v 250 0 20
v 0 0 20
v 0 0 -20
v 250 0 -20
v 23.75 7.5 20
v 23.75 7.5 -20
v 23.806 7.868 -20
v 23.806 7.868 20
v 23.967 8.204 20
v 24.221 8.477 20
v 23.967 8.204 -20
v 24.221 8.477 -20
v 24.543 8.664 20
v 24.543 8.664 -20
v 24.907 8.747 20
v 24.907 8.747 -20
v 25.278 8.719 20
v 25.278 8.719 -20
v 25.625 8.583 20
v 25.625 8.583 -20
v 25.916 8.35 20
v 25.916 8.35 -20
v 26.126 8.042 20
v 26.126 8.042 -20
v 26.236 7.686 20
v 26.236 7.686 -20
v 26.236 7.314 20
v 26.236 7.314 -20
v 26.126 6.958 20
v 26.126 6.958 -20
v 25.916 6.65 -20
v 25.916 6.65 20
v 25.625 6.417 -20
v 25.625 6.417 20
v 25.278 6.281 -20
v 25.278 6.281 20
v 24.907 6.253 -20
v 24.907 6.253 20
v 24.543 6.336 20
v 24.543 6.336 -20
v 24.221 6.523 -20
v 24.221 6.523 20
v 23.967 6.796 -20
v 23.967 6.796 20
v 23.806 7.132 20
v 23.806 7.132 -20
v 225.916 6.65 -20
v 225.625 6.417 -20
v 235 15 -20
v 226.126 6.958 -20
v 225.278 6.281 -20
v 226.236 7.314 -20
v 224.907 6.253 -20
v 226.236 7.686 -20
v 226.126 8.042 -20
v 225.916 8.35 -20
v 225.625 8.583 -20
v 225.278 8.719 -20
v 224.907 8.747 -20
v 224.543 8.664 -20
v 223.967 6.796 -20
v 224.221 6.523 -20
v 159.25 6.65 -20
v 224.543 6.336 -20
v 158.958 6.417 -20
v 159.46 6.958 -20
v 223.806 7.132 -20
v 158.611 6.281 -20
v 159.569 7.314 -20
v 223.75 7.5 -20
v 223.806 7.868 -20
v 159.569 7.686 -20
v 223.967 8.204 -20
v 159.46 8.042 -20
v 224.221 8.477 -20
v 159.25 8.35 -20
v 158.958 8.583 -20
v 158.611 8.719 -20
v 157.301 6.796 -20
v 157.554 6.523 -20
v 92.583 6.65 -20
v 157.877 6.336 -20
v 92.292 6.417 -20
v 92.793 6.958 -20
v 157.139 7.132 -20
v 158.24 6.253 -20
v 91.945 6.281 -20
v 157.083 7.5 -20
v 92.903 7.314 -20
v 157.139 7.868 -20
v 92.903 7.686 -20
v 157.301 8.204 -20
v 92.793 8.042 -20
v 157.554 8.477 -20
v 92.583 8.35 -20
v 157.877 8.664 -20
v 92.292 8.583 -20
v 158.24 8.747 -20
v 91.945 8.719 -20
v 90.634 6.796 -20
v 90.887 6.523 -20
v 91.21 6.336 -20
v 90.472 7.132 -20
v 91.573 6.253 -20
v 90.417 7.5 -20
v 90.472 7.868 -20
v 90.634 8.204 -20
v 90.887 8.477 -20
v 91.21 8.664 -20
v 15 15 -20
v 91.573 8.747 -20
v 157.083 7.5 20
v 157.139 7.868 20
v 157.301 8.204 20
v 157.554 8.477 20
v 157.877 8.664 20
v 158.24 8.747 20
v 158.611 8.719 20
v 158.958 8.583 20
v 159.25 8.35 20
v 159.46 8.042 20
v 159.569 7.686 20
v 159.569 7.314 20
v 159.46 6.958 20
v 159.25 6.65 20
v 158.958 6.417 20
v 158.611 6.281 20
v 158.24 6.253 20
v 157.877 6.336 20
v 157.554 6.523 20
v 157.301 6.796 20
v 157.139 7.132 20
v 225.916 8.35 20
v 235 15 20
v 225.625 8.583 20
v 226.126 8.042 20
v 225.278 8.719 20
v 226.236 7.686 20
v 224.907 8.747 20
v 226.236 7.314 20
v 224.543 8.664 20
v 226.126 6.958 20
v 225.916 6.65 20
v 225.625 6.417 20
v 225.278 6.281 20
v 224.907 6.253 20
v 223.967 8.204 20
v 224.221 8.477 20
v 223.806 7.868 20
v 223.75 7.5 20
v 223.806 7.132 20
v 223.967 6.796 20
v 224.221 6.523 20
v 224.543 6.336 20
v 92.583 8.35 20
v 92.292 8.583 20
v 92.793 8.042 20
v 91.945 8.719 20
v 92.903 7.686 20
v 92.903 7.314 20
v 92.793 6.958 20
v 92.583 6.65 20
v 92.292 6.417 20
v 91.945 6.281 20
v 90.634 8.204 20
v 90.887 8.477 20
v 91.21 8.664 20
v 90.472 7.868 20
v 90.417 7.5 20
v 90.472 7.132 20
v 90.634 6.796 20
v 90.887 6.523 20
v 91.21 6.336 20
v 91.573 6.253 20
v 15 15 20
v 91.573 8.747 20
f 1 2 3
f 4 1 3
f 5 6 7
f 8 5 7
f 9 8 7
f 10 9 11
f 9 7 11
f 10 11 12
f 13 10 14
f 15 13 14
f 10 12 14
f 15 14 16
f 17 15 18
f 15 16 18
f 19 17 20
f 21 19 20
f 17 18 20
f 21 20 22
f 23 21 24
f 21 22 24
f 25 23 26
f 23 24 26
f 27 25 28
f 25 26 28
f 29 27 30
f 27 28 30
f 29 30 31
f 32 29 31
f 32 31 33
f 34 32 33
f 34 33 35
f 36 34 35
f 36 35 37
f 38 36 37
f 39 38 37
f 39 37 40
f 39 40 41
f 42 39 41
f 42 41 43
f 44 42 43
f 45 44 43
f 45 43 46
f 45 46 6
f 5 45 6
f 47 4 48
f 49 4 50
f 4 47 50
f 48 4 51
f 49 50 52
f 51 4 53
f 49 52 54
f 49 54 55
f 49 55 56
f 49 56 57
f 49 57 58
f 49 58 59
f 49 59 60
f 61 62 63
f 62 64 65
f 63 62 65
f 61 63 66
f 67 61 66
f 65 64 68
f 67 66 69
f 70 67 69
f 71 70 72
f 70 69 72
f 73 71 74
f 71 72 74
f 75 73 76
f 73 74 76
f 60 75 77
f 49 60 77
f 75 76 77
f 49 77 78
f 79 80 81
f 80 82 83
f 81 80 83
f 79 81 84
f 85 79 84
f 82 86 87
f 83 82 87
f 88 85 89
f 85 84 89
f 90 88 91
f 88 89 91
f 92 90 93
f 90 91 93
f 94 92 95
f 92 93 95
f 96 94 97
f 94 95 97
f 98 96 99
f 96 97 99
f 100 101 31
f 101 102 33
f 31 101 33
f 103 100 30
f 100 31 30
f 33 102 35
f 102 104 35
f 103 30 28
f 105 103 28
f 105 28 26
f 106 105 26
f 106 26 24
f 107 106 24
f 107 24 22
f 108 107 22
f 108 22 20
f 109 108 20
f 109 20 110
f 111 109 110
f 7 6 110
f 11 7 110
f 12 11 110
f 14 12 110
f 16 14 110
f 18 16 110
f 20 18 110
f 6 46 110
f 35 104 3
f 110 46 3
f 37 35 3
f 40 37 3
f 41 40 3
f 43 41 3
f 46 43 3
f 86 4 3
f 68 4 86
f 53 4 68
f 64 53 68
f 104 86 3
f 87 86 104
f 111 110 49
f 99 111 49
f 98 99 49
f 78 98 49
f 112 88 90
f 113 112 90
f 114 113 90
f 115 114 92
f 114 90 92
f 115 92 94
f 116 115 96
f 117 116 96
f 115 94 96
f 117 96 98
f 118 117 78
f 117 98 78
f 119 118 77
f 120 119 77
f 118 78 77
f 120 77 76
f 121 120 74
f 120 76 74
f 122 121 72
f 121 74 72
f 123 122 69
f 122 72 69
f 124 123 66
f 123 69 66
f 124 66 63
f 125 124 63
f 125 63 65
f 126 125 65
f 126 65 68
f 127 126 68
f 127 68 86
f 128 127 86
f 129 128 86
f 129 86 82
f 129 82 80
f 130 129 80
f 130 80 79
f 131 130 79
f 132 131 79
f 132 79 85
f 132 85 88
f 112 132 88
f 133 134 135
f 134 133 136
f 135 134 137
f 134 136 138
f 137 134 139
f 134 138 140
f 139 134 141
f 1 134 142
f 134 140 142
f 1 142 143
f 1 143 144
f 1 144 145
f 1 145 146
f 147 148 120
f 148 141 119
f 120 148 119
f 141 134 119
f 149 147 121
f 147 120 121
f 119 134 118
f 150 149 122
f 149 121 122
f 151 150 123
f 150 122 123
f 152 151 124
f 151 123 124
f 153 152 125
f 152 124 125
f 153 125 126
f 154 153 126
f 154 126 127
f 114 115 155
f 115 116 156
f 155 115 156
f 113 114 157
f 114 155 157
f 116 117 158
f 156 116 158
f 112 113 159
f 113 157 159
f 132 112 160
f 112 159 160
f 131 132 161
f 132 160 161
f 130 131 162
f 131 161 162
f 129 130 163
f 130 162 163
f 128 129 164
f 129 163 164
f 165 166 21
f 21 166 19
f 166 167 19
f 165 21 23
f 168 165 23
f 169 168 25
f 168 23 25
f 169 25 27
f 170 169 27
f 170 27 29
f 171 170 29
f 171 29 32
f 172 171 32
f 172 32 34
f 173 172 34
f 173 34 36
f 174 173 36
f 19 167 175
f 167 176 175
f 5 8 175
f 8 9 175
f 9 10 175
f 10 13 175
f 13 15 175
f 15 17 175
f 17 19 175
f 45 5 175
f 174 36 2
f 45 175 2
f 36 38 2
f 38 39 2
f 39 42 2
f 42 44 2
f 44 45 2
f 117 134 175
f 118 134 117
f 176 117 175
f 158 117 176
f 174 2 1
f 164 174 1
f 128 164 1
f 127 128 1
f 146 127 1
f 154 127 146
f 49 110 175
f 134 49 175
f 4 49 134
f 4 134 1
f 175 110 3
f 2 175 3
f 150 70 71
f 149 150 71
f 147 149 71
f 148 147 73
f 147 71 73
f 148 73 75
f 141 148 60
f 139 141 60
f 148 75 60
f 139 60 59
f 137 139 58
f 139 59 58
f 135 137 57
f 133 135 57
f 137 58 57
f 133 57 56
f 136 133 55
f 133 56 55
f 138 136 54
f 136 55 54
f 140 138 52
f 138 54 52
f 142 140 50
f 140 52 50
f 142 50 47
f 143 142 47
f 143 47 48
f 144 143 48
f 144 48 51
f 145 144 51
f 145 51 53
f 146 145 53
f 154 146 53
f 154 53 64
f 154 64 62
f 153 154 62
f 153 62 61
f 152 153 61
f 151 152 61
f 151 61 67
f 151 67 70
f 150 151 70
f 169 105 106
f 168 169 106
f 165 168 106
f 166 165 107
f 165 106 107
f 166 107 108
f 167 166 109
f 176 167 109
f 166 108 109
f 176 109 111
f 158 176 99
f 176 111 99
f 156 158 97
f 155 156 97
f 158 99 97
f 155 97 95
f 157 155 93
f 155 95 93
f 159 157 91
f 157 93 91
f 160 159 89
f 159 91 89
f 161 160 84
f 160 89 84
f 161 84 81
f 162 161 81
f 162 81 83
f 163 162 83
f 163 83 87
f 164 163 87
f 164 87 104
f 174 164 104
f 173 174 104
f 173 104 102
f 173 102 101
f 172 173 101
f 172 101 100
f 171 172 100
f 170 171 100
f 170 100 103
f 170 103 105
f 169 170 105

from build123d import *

# Parameters (mm, degrees)
SALIENTE_EXTRUIR1_DEPTH = 250
CROQUIS2_R              = 1.25
CORTAR_EXTRUIR1_DEPTH   = 41


with BuildPart() as part:
    # Croquis1 → Saliente-Extruir1 (new body)
    with BuildSketch(Plane(origin=(0, 0, 0), x_dir=(0, 0, -1), z_dir=(1, 0, 0))):
        Polygon((-20, 0), (20, 0), (20, 15), (18.5, 15), (-18.5, 15), (-20, 15), align=None)
    extrude(amount=SALIENTE_EXTRUIR1_DEPTH)

    # Croquis2 → Cortar-Extruir1 (cut, through all)
    with BuildSketch(Plane(origin=(0, 0, -20), x_dir=(-1, 0, 0), z_dir=(0, 0, -1))):
        with Locations((-225, 7.5)):
            Circle(CROQUIS2_R)
        with Locations((-25, 7.5)):
            Circle(CROQUIS2_R)
        with Locations((-158.333333333, 7.5)):
            Circle(CROQUIS2_R)
        with Locations((-91.666666667, 7.5)):
            Circle(CROQUIS2_R)
        Polygon((0, 15), (-15, 15), (0, 0), align=None)
        Polygon((-250, 15), (-235, 15), (-250, 0), align=None)
    extrude(amount=-CORTAR_EXTRUIR1_DEPTH, mode=Mode.SUBTRACT)


solid = part.part
